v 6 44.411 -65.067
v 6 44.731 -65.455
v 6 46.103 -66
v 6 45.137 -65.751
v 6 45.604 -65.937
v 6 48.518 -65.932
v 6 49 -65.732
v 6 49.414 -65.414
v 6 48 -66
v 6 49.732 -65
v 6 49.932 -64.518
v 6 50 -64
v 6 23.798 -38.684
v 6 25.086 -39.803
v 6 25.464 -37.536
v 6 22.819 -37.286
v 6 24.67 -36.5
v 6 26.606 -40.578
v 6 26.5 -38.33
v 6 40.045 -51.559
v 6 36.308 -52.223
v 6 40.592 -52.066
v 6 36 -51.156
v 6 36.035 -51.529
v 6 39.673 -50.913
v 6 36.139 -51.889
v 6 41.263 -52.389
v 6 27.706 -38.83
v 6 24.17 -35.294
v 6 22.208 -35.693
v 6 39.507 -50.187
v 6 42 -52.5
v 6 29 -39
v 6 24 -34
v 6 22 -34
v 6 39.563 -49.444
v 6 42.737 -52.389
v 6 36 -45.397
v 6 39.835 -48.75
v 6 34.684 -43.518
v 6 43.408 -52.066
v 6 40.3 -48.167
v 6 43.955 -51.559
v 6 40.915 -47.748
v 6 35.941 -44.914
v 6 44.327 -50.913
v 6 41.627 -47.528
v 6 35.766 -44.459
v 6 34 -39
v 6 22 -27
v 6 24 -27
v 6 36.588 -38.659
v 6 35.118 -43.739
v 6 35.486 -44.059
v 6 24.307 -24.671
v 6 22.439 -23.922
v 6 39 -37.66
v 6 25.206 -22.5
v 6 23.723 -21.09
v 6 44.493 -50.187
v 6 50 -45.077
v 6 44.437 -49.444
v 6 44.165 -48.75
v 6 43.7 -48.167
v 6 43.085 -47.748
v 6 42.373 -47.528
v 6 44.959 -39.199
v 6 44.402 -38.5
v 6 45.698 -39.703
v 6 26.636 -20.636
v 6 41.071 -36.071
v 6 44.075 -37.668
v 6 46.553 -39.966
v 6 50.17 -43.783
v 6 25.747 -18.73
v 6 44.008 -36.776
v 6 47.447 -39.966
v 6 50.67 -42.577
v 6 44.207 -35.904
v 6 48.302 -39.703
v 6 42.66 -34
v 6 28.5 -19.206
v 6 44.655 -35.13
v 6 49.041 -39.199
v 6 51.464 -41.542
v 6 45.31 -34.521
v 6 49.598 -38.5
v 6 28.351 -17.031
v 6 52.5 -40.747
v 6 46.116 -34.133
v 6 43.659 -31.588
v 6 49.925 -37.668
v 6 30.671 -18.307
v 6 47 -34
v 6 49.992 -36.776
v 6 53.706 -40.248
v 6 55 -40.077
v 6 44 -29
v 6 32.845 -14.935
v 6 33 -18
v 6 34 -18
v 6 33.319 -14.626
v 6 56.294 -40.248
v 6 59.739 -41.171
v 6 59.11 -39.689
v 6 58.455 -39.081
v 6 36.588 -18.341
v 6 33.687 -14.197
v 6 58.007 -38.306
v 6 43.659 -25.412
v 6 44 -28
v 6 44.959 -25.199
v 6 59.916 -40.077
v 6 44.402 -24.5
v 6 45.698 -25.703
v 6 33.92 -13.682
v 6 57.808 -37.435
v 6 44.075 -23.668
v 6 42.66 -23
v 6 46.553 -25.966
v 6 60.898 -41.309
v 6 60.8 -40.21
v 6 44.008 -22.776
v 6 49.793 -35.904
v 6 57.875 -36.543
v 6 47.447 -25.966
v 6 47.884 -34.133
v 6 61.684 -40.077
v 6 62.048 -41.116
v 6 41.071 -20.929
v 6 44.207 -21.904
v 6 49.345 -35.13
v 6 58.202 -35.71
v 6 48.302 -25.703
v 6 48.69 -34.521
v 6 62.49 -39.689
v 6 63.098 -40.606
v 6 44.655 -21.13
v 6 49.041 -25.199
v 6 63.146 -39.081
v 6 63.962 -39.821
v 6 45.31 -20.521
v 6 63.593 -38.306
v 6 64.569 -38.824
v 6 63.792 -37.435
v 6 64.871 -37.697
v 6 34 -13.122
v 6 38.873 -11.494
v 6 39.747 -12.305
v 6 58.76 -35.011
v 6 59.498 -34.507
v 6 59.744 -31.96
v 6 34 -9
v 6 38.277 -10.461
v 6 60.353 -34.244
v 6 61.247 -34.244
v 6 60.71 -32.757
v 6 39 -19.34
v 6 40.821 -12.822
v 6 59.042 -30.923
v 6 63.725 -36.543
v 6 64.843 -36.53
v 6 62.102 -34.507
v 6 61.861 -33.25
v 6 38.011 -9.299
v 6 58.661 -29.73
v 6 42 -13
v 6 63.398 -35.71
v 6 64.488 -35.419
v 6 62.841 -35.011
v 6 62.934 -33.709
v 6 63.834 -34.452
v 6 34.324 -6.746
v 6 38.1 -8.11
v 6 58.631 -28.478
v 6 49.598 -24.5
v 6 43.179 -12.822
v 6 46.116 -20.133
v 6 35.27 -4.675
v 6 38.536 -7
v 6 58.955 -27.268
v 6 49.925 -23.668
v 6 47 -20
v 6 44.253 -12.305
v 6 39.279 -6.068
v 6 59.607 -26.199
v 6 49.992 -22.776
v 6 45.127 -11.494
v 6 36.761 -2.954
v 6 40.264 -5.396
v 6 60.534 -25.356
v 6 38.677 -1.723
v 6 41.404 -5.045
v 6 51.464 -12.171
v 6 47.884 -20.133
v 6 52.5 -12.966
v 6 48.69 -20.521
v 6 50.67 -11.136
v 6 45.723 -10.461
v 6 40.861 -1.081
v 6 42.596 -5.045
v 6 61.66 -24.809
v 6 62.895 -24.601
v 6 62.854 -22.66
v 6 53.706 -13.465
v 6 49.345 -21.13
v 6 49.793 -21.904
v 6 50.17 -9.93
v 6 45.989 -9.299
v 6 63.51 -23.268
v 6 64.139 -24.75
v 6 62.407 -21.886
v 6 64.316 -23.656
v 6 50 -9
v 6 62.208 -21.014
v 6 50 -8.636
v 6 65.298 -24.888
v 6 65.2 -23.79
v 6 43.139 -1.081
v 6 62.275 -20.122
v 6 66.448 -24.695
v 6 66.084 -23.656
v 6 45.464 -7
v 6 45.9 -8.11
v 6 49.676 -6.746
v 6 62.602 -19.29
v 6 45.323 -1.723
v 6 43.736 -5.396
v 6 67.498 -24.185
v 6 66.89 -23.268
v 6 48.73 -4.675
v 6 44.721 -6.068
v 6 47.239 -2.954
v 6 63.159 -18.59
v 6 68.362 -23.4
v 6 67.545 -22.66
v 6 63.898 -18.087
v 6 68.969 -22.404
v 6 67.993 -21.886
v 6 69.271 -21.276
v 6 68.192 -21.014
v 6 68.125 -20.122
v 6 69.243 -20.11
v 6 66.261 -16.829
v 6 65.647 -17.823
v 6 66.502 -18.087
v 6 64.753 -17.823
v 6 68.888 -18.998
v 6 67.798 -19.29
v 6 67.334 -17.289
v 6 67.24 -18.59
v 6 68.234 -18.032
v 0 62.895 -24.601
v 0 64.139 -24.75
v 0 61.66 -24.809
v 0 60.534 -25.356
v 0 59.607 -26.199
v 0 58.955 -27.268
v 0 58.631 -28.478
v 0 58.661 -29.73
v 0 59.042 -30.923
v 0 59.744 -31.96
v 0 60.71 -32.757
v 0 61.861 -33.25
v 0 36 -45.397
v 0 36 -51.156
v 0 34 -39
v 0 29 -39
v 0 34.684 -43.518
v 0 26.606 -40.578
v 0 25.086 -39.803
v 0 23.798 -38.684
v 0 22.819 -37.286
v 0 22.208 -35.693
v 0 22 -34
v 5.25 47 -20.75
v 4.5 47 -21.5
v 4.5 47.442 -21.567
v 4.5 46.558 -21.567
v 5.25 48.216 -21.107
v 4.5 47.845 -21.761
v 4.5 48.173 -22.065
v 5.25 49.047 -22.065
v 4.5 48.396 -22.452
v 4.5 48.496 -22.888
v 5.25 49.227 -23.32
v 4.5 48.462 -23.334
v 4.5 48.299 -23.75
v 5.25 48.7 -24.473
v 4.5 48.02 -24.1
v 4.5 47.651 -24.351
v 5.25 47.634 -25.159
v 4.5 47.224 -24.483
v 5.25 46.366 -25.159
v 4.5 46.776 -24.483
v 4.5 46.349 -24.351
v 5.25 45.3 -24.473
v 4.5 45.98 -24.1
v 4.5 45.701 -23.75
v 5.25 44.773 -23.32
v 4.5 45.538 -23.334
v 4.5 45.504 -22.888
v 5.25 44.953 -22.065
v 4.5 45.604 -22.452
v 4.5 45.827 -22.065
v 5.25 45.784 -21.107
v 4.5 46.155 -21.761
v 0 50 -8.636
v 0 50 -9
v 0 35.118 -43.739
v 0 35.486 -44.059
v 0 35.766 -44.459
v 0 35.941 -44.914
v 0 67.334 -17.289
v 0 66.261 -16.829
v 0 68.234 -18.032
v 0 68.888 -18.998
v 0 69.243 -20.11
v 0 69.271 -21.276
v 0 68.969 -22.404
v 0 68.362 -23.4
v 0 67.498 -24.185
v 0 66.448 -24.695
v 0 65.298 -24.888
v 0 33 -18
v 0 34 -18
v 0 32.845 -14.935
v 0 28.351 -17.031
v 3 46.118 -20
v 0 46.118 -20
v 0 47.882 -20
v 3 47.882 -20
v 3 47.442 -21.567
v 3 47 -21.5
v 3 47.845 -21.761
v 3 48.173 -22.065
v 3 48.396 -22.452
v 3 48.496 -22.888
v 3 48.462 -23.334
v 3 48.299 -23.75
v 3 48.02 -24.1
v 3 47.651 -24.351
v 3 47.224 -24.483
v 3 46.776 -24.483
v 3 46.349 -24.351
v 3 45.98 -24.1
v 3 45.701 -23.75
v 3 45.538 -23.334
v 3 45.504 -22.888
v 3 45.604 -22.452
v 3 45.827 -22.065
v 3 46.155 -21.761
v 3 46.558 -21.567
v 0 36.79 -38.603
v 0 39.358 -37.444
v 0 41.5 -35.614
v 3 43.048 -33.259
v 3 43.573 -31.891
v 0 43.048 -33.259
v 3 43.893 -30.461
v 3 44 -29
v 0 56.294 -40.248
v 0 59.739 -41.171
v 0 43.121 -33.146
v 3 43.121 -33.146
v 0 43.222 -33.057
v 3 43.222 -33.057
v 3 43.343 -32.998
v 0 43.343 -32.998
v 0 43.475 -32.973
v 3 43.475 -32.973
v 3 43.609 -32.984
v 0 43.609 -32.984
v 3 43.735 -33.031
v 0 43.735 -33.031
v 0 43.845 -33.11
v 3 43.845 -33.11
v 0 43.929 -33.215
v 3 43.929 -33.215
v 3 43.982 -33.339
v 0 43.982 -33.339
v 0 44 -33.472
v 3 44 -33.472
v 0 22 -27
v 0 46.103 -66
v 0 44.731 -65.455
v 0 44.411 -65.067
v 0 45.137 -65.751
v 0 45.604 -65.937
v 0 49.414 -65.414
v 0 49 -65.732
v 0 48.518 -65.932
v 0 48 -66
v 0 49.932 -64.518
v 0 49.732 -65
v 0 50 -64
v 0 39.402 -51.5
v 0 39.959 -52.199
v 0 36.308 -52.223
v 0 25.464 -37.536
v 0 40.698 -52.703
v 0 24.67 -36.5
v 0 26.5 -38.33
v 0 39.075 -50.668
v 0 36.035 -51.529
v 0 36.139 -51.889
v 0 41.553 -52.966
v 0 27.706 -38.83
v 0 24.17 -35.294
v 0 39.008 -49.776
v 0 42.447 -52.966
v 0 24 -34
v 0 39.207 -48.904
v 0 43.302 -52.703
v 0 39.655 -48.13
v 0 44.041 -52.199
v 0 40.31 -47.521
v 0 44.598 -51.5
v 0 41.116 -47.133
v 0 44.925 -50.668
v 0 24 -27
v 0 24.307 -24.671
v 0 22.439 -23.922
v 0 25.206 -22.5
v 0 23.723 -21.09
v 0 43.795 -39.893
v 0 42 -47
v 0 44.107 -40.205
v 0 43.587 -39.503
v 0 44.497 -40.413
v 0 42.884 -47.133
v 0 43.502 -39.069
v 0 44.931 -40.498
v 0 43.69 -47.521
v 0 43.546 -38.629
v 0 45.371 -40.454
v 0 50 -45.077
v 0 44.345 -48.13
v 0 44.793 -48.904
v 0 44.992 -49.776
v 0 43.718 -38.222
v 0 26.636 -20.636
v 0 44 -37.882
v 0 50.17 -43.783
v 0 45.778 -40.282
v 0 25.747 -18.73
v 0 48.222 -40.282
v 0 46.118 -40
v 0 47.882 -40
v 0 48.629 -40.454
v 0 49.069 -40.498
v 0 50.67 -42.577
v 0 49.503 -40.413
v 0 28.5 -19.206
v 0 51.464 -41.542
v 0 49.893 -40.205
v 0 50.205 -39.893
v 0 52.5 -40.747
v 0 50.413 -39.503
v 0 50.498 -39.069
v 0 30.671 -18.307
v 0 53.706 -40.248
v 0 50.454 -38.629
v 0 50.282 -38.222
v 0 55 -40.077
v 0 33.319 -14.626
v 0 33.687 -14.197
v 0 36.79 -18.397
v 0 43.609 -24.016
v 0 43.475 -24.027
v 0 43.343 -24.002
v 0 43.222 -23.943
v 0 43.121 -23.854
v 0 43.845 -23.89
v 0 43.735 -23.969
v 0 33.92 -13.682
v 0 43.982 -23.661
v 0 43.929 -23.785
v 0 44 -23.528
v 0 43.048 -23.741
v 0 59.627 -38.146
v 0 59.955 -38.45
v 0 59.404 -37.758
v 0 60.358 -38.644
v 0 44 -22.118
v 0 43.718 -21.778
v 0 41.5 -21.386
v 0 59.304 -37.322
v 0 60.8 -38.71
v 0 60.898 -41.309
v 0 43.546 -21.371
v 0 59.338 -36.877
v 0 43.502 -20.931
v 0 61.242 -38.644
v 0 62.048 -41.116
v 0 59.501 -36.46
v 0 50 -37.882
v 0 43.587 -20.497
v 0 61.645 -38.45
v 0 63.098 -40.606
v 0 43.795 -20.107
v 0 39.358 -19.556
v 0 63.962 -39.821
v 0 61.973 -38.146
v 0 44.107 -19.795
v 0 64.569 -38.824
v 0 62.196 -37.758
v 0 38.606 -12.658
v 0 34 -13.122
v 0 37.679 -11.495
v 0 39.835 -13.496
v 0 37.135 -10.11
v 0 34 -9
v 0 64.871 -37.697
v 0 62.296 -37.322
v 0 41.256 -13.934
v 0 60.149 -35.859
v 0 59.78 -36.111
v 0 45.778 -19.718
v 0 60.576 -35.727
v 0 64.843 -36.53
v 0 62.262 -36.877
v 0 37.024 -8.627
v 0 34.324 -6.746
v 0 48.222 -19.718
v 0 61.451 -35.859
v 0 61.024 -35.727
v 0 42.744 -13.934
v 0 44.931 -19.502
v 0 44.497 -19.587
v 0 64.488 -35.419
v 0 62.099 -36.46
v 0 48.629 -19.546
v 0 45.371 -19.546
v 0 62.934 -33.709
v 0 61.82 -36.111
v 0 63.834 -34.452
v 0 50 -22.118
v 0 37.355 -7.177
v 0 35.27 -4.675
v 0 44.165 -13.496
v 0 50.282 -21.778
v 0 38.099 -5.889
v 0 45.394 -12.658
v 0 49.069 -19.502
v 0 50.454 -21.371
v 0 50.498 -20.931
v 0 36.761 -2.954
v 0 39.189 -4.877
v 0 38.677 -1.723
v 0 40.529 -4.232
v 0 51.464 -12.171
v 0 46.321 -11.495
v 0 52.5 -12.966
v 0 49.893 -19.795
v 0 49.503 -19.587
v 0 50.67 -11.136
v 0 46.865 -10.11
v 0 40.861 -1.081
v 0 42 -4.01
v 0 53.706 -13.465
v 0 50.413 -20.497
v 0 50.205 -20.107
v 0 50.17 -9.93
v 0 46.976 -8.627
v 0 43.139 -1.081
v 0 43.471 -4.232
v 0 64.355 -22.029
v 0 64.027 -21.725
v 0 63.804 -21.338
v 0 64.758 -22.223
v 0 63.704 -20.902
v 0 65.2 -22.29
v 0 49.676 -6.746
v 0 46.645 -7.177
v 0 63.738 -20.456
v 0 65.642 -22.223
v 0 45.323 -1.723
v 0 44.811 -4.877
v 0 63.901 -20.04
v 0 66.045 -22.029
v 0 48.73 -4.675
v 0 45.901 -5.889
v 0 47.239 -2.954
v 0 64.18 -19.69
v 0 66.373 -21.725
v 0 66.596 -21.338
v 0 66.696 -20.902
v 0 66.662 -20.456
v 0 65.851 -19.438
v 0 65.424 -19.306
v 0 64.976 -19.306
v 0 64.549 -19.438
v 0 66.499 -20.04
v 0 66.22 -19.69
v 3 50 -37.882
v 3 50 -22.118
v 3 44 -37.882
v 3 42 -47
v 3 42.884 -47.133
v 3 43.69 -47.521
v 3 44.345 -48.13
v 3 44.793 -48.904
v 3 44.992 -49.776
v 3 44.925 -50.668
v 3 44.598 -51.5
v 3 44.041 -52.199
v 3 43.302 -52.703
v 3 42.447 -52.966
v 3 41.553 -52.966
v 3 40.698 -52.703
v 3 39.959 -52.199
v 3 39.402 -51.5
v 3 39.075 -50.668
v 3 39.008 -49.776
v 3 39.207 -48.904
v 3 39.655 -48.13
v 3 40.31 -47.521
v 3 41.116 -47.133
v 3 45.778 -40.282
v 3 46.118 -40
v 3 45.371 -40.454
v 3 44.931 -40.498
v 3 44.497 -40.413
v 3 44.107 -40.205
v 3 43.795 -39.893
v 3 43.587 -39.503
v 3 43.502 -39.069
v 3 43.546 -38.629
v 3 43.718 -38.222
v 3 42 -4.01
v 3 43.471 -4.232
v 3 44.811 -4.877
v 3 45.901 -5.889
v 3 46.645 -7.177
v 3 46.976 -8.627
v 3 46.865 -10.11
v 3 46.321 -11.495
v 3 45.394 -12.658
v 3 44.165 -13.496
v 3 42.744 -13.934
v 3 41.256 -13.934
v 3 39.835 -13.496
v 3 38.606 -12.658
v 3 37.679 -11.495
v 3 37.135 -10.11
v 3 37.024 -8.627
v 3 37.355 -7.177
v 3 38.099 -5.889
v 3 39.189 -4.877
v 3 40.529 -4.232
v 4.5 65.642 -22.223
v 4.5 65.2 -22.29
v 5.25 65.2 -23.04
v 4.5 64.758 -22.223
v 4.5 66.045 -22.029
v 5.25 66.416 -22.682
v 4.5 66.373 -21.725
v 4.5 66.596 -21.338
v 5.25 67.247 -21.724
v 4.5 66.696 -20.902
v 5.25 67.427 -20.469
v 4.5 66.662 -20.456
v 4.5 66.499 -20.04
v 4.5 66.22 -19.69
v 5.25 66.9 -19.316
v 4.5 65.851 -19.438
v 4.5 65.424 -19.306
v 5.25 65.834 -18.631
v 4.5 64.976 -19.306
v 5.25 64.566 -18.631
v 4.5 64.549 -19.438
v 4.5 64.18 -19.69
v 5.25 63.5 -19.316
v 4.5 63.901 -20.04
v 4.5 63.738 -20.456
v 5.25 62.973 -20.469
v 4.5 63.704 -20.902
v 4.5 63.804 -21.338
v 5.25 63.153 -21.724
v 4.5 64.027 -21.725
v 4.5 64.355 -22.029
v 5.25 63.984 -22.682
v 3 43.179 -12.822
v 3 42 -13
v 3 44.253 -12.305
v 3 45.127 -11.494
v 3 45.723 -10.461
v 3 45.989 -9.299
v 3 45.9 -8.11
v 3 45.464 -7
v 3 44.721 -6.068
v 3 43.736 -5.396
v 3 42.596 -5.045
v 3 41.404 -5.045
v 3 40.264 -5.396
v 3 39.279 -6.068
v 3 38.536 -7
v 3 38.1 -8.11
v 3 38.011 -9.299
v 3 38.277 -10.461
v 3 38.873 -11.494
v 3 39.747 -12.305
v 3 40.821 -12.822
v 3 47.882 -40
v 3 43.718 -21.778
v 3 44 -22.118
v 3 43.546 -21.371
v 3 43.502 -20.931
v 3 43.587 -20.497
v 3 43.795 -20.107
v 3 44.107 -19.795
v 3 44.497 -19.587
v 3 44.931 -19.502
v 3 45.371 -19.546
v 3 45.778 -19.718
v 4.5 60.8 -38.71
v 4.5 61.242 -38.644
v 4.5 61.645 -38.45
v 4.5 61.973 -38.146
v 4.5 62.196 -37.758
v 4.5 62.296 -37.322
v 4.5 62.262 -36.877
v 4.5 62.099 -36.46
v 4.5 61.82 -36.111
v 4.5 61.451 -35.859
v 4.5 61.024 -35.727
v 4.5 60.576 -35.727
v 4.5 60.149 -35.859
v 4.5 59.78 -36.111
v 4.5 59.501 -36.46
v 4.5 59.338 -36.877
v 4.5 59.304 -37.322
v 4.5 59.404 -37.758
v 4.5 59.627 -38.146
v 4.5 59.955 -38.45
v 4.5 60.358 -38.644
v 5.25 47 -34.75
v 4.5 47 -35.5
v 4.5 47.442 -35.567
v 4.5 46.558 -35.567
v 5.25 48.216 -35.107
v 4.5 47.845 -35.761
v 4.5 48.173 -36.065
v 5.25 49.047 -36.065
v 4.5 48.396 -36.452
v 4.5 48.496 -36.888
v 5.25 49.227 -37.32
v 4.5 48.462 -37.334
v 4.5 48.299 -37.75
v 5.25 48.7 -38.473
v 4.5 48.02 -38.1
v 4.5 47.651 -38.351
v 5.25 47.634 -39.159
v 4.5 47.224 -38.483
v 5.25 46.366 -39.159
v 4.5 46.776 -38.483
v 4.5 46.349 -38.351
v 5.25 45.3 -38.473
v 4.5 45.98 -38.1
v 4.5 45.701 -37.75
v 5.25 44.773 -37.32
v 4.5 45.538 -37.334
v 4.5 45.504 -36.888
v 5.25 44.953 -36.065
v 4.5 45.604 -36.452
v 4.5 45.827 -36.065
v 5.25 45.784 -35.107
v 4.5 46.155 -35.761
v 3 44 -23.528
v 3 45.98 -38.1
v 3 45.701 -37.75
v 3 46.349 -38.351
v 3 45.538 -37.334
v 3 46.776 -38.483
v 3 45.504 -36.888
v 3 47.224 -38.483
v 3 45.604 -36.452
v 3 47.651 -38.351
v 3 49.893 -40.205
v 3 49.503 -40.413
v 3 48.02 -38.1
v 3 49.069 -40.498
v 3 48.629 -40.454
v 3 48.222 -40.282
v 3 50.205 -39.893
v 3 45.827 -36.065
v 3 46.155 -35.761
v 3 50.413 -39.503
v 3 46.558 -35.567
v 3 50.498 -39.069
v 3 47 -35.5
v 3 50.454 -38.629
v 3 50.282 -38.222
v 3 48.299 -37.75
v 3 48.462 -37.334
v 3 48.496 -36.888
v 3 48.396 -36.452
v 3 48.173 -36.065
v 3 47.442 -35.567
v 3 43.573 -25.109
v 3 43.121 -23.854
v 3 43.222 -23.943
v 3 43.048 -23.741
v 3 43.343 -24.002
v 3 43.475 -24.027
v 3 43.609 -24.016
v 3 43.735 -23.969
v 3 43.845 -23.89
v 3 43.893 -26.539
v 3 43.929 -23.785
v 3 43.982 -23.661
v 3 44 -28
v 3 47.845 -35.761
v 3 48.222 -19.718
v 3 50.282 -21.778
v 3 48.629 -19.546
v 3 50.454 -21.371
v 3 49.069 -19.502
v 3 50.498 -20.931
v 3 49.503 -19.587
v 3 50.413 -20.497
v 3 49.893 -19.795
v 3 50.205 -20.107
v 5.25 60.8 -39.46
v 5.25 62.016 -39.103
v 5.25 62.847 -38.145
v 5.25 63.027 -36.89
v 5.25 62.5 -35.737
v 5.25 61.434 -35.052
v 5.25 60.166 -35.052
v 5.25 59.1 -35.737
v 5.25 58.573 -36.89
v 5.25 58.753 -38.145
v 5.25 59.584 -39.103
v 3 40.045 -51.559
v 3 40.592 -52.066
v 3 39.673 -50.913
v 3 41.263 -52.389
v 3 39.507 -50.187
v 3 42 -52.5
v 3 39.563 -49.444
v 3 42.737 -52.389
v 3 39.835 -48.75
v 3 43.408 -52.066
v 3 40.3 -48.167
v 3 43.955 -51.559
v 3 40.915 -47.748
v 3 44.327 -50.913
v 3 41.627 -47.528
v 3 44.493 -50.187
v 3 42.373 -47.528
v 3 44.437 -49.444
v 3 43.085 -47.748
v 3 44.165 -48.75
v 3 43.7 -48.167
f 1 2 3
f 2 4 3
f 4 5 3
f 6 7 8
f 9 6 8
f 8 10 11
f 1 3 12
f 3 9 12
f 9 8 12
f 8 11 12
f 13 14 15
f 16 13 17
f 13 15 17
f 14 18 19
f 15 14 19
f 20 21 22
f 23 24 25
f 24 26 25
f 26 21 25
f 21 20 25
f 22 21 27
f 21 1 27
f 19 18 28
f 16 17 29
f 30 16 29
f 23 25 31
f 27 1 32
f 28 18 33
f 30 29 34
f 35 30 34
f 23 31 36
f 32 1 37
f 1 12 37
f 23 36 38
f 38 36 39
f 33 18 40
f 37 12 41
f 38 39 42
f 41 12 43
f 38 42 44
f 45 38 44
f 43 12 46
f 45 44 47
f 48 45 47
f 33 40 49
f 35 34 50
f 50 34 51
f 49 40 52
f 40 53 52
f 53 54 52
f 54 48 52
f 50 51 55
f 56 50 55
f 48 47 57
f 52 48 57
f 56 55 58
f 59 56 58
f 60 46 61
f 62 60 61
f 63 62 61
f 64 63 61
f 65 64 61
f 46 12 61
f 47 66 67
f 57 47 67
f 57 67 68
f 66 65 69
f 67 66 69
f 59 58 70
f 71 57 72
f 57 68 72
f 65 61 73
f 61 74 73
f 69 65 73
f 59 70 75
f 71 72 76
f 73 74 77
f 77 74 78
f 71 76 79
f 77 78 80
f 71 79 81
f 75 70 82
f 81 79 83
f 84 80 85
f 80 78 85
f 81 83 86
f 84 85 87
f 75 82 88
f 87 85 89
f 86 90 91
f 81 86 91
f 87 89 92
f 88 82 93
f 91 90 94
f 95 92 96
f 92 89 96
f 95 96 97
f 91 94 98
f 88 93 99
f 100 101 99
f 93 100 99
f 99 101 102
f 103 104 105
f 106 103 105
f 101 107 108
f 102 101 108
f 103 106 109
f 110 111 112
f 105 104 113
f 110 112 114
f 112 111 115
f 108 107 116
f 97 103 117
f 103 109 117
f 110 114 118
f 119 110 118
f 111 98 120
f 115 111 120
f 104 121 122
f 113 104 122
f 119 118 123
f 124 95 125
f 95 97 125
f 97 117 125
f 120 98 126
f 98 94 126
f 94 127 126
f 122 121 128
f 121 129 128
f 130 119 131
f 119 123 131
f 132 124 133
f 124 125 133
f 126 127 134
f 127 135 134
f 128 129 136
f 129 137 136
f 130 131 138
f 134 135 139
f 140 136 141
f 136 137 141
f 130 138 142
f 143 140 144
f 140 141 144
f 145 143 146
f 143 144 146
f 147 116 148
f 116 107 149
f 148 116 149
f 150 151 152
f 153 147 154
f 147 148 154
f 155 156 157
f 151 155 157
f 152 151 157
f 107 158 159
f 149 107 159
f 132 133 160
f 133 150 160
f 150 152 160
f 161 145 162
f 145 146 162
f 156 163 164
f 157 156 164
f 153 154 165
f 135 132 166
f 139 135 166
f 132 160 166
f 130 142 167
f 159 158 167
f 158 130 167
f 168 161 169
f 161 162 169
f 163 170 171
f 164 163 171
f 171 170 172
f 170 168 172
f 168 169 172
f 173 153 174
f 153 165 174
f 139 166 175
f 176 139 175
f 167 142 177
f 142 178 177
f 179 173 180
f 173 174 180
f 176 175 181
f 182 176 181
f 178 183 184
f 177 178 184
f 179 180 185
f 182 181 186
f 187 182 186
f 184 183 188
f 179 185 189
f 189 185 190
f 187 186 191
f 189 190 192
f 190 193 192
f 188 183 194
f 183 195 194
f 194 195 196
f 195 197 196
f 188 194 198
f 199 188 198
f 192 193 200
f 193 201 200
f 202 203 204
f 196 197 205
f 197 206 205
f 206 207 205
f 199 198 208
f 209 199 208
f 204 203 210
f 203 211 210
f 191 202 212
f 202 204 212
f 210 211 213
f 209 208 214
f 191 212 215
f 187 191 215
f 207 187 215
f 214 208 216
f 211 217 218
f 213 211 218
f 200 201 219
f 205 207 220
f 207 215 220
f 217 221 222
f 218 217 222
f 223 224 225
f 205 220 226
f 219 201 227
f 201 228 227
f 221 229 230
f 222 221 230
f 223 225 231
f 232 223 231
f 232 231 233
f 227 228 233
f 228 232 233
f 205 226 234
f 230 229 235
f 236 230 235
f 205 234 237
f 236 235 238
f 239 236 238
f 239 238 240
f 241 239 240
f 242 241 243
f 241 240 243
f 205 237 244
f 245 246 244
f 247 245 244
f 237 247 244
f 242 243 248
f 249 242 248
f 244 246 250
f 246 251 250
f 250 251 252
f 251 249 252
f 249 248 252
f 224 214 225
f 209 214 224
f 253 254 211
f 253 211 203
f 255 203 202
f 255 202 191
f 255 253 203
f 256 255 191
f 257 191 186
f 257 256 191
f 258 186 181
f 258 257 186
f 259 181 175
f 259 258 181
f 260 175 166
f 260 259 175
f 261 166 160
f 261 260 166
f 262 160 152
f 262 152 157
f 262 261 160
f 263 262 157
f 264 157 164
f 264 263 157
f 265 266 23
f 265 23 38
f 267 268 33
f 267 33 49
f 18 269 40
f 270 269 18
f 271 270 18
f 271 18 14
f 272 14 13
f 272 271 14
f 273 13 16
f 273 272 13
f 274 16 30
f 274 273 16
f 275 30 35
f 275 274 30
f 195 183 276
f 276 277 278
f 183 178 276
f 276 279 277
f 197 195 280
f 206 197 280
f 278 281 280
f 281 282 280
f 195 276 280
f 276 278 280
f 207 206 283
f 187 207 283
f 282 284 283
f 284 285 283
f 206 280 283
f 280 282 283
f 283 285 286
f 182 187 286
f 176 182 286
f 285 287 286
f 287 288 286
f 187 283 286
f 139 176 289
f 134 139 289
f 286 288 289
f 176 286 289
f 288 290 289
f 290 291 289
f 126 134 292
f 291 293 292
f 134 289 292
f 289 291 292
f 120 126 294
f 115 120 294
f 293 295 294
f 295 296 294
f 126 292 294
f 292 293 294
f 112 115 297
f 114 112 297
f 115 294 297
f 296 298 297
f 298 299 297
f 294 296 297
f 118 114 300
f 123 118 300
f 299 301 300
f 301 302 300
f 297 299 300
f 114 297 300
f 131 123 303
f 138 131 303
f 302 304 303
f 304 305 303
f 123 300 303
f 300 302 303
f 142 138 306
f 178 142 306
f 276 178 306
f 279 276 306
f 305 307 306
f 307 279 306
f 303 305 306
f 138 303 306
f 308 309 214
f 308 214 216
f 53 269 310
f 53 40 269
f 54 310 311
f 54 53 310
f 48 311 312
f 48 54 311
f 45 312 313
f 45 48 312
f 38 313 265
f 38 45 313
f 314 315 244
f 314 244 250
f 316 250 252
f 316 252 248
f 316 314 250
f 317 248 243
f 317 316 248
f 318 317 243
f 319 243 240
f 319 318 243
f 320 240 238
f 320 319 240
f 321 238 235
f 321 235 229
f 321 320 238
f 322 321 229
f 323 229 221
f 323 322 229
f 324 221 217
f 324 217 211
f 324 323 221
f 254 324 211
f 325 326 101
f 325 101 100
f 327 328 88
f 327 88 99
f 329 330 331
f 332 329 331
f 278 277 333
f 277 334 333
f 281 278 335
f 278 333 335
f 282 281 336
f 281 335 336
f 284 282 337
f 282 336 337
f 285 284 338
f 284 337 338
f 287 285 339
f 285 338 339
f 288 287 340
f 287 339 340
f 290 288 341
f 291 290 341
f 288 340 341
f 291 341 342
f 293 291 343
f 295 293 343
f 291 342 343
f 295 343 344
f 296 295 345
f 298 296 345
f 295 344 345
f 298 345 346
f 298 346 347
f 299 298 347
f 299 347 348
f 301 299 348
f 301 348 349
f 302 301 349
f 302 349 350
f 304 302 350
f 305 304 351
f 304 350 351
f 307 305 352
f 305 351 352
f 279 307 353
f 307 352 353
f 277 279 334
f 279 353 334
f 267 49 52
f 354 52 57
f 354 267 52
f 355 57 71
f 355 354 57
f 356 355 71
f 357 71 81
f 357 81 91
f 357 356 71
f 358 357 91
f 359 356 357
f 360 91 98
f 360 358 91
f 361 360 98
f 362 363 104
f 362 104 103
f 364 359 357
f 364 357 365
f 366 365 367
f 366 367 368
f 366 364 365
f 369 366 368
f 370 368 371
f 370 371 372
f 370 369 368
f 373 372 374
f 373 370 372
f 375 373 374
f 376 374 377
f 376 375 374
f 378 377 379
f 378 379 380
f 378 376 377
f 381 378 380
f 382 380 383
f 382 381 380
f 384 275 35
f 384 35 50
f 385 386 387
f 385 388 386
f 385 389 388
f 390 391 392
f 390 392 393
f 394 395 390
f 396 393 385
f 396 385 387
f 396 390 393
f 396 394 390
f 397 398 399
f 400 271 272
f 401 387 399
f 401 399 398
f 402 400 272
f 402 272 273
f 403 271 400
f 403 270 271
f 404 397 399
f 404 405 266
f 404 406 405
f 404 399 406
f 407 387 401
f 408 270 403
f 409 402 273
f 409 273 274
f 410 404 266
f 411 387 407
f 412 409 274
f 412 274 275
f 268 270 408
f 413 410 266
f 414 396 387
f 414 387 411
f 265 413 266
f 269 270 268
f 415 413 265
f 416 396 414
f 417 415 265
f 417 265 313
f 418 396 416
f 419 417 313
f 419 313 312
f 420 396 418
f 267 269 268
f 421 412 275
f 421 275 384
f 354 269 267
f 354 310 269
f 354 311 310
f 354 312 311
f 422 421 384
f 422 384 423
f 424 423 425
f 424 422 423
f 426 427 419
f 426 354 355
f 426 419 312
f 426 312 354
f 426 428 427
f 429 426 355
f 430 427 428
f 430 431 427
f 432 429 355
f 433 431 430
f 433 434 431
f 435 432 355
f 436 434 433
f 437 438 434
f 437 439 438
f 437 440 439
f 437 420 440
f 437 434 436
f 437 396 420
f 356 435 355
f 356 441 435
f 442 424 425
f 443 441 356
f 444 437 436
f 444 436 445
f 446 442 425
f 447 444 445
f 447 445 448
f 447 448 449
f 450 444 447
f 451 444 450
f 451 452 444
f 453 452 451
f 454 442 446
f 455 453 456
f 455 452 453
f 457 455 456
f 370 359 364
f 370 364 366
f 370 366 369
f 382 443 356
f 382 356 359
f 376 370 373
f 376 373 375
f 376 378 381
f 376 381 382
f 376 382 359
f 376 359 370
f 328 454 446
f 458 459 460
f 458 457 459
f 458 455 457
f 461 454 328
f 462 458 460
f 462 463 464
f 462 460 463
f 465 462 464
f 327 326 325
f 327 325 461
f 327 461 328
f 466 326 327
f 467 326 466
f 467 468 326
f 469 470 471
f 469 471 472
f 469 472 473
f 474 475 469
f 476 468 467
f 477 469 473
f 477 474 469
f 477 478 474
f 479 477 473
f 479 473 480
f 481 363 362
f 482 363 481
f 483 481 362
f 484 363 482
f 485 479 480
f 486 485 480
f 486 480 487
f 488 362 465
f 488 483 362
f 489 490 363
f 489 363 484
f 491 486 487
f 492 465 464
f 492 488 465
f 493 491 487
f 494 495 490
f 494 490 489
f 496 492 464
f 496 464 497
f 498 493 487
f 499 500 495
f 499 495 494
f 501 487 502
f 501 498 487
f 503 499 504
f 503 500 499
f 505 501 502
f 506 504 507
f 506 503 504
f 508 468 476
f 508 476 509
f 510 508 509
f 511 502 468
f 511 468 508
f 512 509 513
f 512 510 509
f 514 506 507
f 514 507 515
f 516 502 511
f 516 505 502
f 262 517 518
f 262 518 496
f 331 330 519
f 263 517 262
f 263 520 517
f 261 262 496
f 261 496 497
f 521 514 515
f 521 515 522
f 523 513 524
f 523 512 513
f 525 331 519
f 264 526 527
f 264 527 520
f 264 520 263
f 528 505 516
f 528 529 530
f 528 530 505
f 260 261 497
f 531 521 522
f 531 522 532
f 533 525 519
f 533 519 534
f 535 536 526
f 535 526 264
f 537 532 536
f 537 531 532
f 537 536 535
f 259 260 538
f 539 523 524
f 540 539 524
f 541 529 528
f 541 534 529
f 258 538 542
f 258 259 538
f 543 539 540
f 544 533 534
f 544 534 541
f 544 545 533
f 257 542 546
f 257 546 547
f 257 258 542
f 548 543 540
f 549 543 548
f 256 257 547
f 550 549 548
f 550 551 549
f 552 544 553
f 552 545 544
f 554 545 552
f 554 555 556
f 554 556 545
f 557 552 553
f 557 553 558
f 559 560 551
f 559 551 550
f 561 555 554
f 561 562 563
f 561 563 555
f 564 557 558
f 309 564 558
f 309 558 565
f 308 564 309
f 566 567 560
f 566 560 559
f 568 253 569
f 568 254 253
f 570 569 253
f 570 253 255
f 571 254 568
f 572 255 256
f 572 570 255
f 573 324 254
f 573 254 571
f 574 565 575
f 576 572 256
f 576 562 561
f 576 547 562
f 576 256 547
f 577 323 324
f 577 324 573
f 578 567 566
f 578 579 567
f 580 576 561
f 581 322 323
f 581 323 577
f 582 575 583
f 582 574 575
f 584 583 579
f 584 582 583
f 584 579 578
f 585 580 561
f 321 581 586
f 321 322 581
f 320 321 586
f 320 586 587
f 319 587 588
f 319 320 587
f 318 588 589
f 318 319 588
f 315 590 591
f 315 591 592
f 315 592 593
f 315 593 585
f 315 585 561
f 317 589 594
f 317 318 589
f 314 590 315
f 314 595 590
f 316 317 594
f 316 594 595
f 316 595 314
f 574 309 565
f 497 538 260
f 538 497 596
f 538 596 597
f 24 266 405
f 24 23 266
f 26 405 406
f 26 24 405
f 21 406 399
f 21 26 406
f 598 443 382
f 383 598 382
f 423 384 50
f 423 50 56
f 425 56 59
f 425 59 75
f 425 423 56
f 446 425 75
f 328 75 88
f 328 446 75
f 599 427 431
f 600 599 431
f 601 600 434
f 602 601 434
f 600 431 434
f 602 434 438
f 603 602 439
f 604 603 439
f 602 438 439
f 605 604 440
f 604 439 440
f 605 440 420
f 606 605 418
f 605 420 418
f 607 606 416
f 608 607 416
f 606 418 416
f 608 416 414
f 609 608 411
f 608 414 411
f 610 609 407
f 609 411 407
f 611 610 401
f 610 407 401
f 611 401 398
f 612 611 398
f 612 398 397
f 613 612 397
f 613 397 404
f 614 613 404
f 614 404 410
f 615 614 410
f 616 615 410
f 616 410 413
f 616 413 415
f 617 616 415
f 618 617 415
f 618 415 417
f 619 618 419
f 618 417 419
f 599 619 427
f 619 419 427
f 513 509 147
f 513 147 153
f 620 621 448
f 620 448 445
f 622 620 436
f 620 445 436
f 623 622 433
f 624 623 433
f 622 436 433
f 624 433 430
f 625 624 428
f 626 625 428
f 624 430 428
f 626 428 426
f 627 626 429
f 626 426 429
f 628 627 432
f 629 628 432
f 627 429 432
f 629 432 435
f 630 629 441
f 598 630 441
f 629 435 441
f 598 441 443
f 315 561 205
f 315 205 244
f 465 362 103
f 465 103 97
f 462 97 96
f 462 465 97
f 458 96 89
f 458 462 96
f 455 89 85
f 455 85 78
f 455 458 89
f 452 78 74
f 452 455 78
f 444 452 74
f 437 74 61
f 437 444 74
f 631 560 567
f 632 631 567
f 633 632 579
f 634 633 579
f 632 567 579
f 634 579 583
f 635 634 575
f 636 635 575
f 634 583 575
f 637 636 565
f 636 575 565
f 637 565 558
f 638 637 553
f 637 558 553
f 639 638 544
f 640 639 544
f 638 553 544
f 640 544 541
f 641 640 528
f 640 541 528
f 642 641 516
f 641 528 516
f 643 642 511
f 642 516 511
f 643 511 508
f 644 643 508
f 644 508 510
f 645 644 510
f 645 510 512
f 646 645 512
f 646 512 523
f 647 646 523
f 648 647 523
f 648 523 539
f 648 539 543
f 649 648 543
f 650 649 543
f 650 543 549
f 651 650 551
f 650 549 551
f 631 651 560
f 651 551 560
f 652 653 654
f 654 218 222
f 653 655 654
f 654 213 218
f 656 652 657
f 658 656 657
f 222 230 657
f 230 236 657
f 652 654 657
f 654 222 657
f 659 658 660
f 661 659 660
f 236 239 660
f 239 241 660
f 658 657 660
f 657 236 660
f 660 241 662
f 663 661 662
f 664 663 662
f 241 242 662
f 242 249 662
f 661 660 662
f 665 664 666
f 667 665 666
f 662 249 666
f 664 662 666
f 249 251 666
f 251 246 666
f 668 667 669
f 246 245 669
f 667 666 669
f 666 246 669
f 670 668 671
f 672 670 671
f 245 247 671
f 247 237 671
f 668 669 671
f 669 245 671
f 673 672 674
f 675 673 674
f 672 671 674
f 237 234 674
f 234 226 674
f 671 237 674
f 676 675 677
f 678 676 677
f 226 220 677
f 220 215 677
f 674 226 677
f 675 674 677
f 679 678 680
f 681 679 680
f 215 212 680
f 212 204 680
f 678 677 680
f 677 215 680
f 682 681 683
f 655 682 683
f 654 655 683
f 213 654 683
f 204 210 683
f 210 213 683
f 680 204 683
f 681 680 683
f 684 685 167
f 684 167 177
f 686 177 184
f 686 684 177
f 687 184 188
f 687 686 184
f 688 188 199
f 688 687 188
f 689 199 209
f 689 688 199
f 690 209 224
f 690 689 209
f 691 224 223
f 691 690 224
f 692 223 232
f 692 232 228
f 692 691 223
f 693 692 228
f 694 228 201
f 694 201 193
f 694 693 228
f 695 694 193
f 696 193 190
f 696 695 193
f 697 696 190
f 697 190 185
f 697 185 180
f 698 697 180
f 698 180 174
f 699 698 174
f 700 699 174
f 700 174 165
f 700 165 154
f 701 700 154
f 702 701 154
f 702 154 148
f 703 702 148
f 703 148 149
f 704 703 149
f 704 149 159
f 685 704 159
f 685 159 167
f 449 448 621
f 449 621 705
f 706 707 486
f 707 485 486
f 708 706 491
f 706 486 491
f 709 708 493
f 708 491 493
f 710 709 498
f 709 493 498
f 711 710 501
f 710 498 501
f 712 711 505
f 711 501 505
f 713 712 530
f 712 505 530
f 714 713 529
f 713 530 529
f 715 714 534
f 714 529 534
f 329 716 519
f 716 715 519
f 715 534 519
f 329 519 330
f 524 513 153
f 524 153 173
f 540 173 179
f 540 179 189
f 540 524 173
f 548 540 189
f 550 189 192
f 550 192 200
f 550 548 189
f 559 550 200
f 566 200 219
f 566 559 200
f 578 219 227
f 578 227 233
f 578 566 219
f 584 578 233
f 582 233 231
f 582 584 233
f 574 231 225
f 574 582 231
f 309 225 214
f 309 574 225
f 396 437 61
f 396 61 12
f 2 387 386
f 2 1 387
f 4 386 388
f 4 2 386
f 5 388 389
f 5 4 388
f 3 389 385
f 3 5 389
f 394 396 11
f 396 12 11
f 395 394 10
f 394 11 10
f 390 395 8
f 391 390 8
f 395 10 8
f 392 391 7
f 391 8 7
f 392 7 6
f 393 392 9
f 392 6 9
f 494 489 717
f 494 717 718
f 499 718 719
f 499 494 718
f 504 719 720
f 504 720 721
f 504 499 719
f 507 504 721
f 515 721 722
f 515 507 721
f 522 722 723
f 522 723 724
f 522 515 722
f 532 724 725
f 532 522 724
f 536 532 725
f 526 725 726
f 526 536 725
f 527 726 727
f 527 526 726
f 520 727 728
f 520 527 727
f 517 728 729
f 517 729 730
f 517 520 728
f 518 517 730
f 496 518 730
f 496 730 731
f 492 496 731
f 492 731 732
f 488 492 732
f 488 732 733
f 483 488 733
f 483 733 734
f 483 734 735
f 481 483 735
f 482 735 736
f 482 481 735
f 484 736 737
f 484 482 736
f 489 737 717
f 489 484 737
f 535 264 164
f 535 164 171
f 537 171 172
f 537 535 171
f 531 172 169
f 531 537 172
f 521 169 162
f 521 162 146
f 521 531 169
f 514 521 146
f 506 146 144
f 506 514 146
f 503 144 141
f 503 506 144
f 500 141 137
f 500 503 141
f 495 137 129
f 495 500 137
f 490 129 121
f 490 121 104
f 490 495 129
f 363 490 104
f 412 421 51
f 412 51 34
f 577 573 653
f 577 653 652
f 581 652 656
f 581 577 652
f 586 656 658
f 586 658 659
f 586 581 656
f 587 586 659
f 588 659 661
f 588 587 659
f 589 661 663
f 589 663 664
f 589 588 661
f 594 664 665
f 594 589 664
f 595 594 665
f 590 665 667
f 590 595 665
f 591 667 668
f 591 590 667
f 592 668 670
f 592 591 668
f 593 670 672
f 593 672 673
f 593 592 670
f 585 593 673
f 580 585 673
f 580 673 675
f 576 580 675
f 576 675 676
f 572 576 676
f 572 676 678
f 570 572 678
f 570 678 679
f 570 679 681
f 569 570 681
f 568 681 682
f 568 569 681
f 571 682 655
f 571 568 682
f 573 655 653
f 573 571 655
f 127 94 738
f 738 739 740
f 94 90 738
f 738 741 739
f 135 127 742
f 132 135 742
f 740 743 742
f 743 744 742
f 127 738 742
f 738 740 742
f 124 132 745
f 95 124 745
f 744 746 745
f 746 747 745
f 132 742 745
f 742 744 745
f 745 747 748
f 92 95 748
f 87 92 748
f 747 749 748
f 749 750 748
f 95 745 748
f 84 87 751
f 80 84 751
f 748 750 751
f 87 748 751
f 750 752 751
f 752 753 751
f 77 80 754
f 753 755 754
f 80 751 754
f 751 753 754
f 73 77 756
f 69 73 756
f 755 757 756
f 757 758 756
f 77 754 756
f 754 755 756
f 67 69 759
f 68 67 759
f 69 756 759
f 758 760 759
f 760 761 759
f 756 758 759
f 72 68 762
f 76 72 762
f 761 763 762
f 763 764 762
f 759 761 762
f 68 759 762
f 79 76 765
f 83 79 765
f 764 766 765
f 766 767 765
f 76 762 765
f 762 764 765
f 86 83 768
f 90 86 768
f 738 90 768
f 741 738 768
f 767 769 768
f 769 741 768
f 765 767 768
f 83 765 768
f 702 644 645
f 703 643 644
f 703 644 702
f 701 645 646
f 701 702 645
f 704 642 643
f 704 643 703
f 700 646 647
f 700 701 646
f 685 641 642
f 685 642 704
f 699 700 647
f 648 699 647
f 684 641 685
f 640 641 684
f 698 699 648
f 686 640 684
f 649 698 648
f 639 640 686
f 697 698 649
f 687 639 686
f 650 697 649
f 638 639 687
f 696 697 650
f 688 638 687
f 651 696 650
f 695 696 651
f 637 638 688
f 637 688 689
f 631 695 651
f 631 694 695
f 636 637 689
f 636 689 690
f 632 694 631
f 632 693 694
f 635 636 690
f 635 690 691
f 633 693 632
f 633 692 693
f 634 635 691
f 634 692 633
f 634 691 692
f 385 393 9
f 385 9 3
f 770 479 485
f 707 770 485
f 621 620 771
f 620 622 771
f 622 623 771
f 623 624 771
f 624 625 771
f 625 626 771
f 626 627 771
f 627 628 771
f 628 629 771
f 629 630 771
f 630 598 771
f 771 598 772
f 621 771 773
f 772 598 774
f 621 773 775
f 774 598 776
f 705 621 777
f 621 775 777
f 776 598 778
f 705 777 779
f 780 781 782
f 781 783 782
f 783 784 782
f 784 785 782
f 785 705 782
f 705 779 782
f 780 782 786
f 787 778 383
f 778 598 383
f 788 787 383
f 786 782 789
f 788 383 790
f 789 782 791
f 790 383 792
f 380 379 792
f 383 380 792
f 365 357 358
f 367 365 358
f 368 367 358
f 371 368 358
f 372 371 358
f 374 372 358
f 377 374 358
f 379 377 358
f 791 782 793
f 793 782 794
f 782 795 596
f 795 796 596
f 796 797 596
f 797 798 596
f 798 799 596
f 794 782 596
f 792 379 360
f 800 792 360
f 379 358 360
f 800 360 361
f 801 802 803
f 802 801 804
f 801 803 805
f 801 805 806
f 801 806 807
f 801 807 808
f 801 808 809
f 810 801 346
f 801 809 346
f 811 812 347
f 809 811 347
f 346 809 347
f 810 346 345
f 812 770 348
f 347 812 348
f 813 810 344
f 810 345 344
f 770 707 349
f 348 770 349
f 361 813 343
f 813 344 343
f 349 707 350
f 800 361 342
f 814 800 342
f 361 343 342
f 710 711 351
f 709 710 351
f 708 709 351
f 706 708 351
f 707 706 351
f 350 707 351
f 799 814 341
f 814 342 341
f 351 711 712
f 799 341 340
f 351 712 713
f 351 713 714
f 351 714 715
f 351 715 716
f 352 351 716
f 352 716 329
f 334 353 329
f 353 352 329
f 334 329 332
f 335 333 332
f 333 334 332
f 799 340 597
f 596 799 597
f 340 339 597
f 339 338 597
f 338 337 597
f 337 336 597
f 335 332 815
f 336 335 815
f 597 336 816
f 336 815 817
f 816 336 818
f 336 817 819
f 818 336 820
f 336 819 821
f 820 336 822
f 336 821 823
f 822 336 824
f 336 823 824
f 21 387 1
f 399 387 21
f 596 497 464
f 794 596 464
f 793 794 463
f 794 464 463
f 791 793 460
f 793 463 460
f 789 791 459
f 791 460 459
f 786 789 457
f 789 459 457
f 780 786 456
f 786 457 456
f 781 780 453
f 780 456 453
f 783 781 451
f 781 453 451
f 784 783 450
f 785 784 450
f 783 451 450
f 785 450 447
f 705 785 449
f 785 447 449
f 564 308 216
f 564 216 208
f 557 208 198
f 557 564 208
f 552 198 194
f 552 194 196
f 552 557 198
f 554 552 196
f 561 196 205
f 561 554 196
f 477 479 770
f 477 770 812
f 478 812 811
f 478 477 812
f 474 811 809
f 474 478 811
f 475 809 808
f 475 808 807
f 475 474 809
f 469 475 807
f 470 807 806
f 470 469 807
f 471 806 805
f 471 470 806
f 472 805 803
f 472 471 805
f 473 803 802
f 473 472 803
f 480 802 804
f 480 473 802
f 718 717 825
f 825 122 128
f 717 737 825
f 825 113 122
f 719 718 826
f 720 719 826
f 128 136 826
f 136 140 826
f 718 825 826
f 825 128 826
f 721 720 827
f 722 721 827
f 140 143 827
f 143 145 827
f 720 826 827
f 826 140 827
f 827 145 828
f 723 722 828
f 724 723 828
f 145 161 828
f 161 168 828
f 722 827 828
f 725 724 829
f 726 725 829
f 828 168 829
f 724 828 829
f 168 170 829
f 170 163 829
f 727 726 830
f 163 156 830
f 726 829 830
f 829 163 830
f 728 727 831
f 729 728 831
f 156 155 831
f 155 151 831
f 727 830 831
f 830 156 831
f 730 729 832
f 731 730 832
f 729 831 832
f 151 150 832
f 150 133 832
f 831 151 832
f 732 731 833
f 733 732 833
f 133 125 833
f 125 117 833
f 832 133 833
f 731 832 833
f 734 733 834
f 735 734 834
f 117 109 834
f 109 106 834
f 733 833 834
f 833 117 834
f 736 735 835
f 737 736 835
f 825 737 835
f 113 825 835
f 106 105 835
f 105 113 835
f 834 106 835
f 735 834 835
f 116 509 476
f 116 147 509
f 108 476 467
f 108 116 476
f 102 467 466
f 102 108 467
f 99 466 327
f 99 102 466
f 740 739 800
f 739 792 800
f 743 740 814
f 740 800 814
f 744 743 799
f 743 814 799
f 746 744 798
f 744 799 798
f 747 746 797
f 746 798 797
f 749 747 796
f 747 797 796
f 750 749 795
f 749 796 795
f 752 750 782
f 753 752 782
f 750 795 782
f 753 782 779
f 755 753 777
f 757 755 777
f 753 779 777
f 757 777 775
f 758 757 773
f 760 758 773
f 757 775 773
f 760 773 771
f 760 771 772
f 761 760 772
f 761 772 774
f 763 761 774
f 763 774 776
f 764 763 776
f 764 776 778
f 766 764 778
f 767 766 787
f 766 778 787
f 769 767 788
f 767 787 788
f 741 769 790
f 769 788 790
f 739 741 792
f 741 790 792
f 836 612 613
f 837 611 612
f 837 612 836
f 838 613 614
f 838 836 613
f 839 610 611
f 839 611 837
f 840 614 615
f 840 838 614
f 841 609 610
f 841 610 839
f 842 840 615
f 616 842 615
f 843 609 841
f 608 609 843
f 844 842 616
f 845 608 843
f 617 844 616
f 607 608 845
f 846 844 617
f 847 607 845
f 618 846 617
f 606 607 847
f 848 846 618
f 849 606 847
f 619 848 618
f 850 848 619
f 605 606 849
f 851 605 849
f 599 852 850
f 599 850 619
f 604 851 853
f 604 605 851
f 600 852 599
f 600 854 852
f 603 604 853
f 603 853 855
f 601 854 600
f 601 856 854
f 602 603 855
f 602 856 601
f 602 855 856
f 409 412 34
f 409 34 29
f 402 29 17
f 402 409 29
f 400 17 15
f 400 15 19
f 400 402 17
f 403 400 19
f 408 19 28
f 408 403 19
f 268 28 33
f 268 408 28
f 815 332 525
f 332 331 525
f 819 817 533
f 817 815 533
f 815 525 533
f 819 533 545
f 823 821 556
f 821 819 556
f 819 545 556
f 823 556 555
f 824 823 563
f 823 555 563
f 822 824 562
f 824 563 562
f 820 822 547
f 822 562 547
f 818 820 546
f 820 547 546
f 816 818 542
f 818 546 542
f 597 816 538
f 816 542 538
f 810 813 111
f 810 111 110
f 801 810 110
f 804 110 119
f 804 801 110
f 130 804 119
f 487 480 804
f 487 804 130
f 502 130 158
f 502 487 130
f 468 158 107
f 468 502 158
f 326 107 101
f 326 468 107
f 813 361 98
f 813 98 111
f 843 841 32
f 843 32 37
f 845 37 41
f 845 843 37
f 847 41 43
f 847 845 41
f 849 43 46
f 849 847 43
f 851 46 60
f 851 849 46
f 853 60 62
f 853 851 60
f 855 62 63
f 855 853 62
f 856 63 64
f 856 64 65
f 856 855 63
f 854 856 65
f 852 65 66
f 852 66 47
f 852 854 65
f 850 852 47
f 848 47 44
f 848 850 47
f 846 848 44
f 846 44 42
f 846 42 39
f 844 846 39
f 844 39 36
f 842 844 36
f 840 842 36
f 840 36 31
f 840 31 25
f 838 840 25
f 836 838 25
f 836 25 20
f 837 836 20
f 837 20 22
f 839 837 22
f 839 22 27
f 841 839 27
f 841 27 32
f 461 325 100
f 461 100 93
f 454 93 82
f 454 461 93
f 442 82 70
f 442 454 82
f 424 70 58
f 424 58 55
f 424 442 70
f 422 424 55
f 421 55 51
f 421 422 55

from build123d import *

# Parameters (mm, degrees)
SKETCH27_R          = 4
SKETCH27_R_2        = 2.5
SKETCH27_R_3        = 1.5
BOSS_EXTRUDE1_DEPTH = 6
SKETCH47_R          = 4.99
CUT_EXTRUDE8_DEPTH  = 3
SKETCH49_W          = 20
SKETCH49_H          = 6
CUT_EXTRUDE11_DEPTH = 3
CUT_EXTRUDE13_REACH = 97.747
SKETCH51_R          = 1.5
FILLET3_R           = 2
CHAMFER1_SIZE       = 1.5
FILLET5_START       = -1
FILLET5_DEPTH       = 4
SKETCH52_R          = 3
CUT_EXTRUDE14_DEPTH = 3
SKETCH53_R          = 1.5
CUT_EXTRUDE15_DEPTH = 3


with BuildPart() as part:
    # Sketch27 → Boss-Extrude1 (new body)
    with BuildSketch(Plane(origin=(0, 0, 0), x_dir=(0, 0, -1), z_dir=(1, 0, 0))):
        with BuildLine():
            Line((9, 50), (8.635545685, 50))
            ThreePointArc((8.635545685, 50), (11.67935283, 51.033233299), (13.465174817, 53.705904774))
            Line((13.465174817, 53.705904774), (16.829334589, 66.261119968))
            ThreePointArc((16.829334589, 66.261119968), (21.850788561, 69.160257771), (24.749926364, 64.138803798))
            ThreePointArc((24.749926364, 64.138803798), (27.861196202, 58.749926364), (33.250073636, 61.861196202))
            ThreePointArc((33.250073636, 61.861196202), (38.271527608, 64.760334004), (41.170665411, 59.738880032))
            Line((41.170665411, 59.738880032), (40.247638104, 56.294095226))
            ThreePointArc((40.247638104, 56.294095226), (41.110500534, 51.956192855), (45.077267236, 50))
            Line((45.077267236, 50), (66, 50))
            Line((66, 50), (66, 45))
            Line((66, 45), (51.734508099, 36))
            Line((51.734508099, 36), (43.997036047, 36))
            Line((43.997036047, 36), (40.577848346, 26.605858997))
            ThreePointArc((40.577848346, 26.605858997), (38.015035054, 23.26593569), (34, 22))
            Line((34, 22), (27, 22))
            ThreePointArc((27, 22), (21.089704308, 23.722694096), (17.030614343, 28.351199121))
            Line((17.030614343, 28.351199121), (14.396535233, 34))
            Line((14.396535233, 34), (9, 34))
            ThreePointArc((9, 34), (1, 42), (9, 50))
        make_face()
        with Locations((9, 42)):
            Circle(SKETCH27_R, mode=Mode.SUBTRACT)
        with Locations((50, 42)):
            Circle(SKETCH27_R_2, mode=Mode.SUBTRACT)
        with Locations((37.210369523, 60.800038117)):
            Circle(SKETCH27_R_3, mode=Mode.SUBTRACT)
        with Locations((20.789630477, 65.199961883)):
            Circle(SKETCH27_R_3, mode=Mode.SUBTRACT)
        with BuildLine():
            Line((29, 44), (28, 44))
            ThreePointArc((28, 44), (20.928932188, 41.071067812), (18, 34))
            Line((18, 34), (18, 33))
            ThreePointArc((18, 33), (20.636038969, 26.636038969), (27, 24))
            Line((27, 24), (34, 24))
            ThreePointArc((34, 24), (37.535533906, 25.464466094), (39, 29))
            Line((39, 29), (39, 34))
            ThreePointArc((39, 34), (36.071067812, 41.071067812), (29, 44))
        make_face(mode=Mode.SUBTRACT)
    extrude(amount=BOSS_EXTRUDE1_DEPTH)

    # Sketch47 → Cut-Extrude8 (cut)
    with BuildSketch(Plane.ZY):
        with Locations((-9, 42)):
            Circle(SKETCH47_R)
    extrude(amount=-CUT_EXTRUDE8_DEPTH, mode=Mode.SUBTRACT)

    # Sketch49 → Cut-Extrude11 (cut)
    with BuildSketch(Plane.ZY):
        with Locations((-30, 47)):
            Rectangle(SKETCH49_W, SKETCH49_H)
    extrude(amount=-CUT_EXTRUDE11_DEPTH, mode=Mode.SUBTRACT)

    # Sketch51 → Cut-Extrude13 (cut, up to next)
    with BuildSketch(Plane.ZY.offset(-3), mode=Mode.PRIVATE) as cut_extrude13_sk1:
        with Locations((-37, 47)):
            Circle(SKETCH51_R)
    cut_extrude13_tool1 = extrude(cut_extrude13_sk1.sketch, amount=-CUT_EXTRUDE13_REACH, mode=Mode.PRIVATE) & part.part
    # Sketch51 → Cut-Extrude13 (cut, up to next)
    with BuildSketch(Plane.ZY.offset(-3), mode=Mode.PRIVATE) as cut_extrude13_sk2:
        with Locations((-23, 47)):
            Circle(SKETCH51_R)
    cut_extrude13_tool2 = extrude(cut_extrude13_sk2.sketch, amount=-CUT_EXTRUDE13_REACH, mode=Mode.PRIVATE) & part.part
    add(cut_extrude13_tool1.solids().sort_by_distance((3, 47, -37))[0], mode=Mode.SUBTRACT)
    add(cut_extrude13_tool2.solids().sort_by_distance((3, 47, -23))[0], mode=Mode.SUBTRACT)

    # Fillet3
    fillet3_edges = [part.edges().sort_by_distance(p)[0] for p in [
        (3, 50, -66),
        (3, 45, -66),
        (3, 36, -51.734508099),
        (3, 36, -43.997036047),
        (3, 34, -14.396535233),
    ]]
    fillet(fillet3_edges, radius=FILLET3_R)

    # Chamfer1
    chamfer1_edges = [part.edges().sort_by_distance(p)[0] for p in [
        (6, 47, -38.5),
        (6, 47, -24.5),
        (6, 60.800038117, -35.710369523),
        (6, 65.199961883, -19.289630477),
    ]]
    chamfer(chamfer1_edges, length=CHAMFER1_SIZE)

    # Fillet5: read off the stored shape, not the designer's step
    # Fillet5 outline → Fillet5 (cut)
    with BuildSketch(Plane.YZ.offset(FILLET5_START)):
        with BuildLine():
            Line((44, -28), (44, -23.527864045))
            ThreePointArc((44, -23.527864045), (43.609108945, -24.015814081), (43.047619048, -23.7408229))
            ThreePointArc((43.047619048, -23.7408229), (43.75900073, -25.817821098), (44, -28))
        make_face()
        with BuildLine():
            ThreePointArc((44, -29), (43.75900073, -31.182178902), (43.047619048, -33.2591771))
            ThreePointArc((43.047619048, -33.2591771), (43.609108945, -32.984185919), (44, -33.472135955))
            Line((44, -33.472135955), (44, -29))
        make_face()
    extrude(amount=FILLET5_DEPTH, mode=Mode.SUBTRACT)

    # Sketch52 → Cut-Extrude14 (cut)
    with BuildSketch(Plane.ZY):
        with Locations((-50, 42)):
            Circle(SKETCH52_R)
    extrude(amount=-CUT_EXTRUDE14_DEPTH, mode=Mode.SUBTRACT)

    # Sketch53 → Cut-Extrude15 (cut)
    with BuildSketch(Plane.ZY):
        with Locations((-39, 49)):
            Circle(SKETCH53_R)
        with Locations((-21, 49)):
            Circle(SKETCH53_R)
        with Locations((-21, 45)):
            Circle(SKETCH53_R)
        with Locations((-39, 45)):
            Circle(SKETCH53_R)
    extrude(amount=-CUT_EXTRUDE15_DEPTH, mode=Mode.SUBTRACT)


solid = part.part
